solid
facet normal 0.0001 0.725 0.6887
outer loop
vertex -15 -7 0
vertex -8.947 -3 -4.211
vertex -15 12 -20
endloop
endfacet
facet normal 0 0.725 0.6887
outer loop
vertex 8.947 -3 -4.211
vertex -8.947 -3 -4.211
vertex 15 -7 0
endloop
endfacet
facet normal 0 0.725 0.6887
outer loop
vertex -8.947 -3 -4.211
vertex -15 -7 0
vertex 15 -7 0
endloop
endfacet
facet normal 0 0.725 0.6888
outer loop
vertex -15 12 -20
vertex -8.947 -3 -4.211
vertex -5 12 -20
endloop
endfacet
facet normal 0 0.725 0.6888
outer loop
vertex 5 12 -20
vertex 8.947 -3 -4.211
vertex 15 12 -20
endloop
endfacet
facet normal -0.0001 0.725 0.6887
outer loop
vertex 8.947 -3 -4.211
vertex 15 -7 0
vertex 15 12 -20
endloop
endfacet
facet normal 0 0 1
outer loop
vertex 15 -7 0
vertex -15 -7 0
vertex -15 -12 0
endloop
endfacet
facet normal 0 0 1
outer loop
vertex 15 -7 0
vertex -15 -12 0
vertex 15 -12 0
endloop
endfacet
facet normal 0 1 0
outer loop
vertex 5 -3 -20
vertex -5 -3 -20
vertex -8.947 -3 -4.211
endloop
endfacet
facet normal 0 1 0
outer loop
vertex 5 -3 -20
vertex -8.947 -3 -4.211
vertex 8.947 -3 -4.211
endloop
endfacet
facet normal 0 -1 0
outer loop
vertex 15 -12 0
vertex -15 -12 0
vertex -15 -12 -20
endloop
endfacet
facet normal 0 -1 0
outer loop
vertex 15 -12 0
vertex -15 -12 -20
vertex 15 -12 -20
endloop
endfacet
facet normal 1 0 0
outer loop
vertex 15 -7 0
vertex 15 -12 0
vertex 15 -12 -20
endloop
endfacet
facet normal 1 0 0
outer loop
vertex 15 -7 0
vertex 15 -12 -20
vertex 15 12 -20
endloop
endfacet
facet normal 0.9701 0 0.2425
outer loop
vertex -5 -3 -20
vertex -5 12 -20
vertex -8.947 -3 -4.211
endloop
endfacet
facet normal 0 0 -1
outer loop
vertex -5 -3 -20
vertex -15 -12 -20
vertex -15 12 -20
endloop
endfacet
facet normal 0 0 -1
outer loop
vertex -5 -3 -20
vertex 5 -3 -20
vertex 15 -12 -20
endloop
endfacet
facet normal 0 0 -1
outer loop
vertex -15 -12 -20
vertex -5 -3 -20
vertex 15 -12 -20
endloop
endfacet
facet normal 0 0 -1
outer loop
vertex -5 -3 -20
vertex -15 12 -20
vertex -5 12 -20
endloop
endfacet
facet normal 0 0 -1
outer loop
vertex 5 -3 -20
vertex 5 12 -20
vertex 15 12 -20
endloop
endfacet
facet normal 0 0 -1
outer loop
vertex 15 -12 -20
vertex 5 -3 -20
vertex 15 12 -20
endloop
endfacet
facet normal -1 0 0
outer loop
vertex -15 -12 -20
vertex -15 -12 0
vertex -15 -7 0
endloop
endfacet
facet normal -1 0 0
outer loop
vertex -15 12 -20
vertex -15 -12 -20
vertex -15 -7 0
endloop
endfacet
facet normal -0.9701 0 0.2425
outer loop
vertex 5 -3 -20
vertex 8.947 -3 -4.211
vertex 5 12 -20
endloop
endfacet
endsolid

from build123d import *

# Parameters (mm, degrees)
SKETCH_1_W          = 30
SKETCH_1_H          = 24
EXTRUDE_1_DEPTH     = 20
CUT_EXTRUDE_1_DEPTH = 15
CUT_EXTRUDE_2_DEPTH = 39


with BuildPart() as part:
    # 草圖1 → 填料-伸長1 (new body)
    with BuildSketch(Plane.XY):
        Rectangle(SKETCH_1_W, SKETCH_1_H)
    extrude(amount=-EXTRUDE_1_DEPTH)

    # 草圖2 → 除料-伸長1 (cut)
    with BuildSketch(Plane(origin=(0, 12, 0), x_dir=(1, 0, 0), z_dir=(0, 1, 0))):
        Polygon((0, 0), (0, 20), (-5, 20), (-10, 0), align=None)
        Polygon((10, 0), (5, 20), (0, 20), (0, 0), align=None)
    extrude(amount=-CUT_EXTRUDE_1_DEPTH, mode=Mode.SUBTRACT)

    # 草圖3 → 除料-伸長2 (cut, through all)
    with BuildSketch(Plane(origin=(15, 0, 0), x_dir=(0, 0, -1), z_dir=(1, 0, 0))):
        Polygon((0, -7), (20, 12), (0, 12), align=None)
    extrude(amount=-CUT_EXTRUDE_2_DEPTH, mode=Mode.SUBTRACT)


solid = part.part
